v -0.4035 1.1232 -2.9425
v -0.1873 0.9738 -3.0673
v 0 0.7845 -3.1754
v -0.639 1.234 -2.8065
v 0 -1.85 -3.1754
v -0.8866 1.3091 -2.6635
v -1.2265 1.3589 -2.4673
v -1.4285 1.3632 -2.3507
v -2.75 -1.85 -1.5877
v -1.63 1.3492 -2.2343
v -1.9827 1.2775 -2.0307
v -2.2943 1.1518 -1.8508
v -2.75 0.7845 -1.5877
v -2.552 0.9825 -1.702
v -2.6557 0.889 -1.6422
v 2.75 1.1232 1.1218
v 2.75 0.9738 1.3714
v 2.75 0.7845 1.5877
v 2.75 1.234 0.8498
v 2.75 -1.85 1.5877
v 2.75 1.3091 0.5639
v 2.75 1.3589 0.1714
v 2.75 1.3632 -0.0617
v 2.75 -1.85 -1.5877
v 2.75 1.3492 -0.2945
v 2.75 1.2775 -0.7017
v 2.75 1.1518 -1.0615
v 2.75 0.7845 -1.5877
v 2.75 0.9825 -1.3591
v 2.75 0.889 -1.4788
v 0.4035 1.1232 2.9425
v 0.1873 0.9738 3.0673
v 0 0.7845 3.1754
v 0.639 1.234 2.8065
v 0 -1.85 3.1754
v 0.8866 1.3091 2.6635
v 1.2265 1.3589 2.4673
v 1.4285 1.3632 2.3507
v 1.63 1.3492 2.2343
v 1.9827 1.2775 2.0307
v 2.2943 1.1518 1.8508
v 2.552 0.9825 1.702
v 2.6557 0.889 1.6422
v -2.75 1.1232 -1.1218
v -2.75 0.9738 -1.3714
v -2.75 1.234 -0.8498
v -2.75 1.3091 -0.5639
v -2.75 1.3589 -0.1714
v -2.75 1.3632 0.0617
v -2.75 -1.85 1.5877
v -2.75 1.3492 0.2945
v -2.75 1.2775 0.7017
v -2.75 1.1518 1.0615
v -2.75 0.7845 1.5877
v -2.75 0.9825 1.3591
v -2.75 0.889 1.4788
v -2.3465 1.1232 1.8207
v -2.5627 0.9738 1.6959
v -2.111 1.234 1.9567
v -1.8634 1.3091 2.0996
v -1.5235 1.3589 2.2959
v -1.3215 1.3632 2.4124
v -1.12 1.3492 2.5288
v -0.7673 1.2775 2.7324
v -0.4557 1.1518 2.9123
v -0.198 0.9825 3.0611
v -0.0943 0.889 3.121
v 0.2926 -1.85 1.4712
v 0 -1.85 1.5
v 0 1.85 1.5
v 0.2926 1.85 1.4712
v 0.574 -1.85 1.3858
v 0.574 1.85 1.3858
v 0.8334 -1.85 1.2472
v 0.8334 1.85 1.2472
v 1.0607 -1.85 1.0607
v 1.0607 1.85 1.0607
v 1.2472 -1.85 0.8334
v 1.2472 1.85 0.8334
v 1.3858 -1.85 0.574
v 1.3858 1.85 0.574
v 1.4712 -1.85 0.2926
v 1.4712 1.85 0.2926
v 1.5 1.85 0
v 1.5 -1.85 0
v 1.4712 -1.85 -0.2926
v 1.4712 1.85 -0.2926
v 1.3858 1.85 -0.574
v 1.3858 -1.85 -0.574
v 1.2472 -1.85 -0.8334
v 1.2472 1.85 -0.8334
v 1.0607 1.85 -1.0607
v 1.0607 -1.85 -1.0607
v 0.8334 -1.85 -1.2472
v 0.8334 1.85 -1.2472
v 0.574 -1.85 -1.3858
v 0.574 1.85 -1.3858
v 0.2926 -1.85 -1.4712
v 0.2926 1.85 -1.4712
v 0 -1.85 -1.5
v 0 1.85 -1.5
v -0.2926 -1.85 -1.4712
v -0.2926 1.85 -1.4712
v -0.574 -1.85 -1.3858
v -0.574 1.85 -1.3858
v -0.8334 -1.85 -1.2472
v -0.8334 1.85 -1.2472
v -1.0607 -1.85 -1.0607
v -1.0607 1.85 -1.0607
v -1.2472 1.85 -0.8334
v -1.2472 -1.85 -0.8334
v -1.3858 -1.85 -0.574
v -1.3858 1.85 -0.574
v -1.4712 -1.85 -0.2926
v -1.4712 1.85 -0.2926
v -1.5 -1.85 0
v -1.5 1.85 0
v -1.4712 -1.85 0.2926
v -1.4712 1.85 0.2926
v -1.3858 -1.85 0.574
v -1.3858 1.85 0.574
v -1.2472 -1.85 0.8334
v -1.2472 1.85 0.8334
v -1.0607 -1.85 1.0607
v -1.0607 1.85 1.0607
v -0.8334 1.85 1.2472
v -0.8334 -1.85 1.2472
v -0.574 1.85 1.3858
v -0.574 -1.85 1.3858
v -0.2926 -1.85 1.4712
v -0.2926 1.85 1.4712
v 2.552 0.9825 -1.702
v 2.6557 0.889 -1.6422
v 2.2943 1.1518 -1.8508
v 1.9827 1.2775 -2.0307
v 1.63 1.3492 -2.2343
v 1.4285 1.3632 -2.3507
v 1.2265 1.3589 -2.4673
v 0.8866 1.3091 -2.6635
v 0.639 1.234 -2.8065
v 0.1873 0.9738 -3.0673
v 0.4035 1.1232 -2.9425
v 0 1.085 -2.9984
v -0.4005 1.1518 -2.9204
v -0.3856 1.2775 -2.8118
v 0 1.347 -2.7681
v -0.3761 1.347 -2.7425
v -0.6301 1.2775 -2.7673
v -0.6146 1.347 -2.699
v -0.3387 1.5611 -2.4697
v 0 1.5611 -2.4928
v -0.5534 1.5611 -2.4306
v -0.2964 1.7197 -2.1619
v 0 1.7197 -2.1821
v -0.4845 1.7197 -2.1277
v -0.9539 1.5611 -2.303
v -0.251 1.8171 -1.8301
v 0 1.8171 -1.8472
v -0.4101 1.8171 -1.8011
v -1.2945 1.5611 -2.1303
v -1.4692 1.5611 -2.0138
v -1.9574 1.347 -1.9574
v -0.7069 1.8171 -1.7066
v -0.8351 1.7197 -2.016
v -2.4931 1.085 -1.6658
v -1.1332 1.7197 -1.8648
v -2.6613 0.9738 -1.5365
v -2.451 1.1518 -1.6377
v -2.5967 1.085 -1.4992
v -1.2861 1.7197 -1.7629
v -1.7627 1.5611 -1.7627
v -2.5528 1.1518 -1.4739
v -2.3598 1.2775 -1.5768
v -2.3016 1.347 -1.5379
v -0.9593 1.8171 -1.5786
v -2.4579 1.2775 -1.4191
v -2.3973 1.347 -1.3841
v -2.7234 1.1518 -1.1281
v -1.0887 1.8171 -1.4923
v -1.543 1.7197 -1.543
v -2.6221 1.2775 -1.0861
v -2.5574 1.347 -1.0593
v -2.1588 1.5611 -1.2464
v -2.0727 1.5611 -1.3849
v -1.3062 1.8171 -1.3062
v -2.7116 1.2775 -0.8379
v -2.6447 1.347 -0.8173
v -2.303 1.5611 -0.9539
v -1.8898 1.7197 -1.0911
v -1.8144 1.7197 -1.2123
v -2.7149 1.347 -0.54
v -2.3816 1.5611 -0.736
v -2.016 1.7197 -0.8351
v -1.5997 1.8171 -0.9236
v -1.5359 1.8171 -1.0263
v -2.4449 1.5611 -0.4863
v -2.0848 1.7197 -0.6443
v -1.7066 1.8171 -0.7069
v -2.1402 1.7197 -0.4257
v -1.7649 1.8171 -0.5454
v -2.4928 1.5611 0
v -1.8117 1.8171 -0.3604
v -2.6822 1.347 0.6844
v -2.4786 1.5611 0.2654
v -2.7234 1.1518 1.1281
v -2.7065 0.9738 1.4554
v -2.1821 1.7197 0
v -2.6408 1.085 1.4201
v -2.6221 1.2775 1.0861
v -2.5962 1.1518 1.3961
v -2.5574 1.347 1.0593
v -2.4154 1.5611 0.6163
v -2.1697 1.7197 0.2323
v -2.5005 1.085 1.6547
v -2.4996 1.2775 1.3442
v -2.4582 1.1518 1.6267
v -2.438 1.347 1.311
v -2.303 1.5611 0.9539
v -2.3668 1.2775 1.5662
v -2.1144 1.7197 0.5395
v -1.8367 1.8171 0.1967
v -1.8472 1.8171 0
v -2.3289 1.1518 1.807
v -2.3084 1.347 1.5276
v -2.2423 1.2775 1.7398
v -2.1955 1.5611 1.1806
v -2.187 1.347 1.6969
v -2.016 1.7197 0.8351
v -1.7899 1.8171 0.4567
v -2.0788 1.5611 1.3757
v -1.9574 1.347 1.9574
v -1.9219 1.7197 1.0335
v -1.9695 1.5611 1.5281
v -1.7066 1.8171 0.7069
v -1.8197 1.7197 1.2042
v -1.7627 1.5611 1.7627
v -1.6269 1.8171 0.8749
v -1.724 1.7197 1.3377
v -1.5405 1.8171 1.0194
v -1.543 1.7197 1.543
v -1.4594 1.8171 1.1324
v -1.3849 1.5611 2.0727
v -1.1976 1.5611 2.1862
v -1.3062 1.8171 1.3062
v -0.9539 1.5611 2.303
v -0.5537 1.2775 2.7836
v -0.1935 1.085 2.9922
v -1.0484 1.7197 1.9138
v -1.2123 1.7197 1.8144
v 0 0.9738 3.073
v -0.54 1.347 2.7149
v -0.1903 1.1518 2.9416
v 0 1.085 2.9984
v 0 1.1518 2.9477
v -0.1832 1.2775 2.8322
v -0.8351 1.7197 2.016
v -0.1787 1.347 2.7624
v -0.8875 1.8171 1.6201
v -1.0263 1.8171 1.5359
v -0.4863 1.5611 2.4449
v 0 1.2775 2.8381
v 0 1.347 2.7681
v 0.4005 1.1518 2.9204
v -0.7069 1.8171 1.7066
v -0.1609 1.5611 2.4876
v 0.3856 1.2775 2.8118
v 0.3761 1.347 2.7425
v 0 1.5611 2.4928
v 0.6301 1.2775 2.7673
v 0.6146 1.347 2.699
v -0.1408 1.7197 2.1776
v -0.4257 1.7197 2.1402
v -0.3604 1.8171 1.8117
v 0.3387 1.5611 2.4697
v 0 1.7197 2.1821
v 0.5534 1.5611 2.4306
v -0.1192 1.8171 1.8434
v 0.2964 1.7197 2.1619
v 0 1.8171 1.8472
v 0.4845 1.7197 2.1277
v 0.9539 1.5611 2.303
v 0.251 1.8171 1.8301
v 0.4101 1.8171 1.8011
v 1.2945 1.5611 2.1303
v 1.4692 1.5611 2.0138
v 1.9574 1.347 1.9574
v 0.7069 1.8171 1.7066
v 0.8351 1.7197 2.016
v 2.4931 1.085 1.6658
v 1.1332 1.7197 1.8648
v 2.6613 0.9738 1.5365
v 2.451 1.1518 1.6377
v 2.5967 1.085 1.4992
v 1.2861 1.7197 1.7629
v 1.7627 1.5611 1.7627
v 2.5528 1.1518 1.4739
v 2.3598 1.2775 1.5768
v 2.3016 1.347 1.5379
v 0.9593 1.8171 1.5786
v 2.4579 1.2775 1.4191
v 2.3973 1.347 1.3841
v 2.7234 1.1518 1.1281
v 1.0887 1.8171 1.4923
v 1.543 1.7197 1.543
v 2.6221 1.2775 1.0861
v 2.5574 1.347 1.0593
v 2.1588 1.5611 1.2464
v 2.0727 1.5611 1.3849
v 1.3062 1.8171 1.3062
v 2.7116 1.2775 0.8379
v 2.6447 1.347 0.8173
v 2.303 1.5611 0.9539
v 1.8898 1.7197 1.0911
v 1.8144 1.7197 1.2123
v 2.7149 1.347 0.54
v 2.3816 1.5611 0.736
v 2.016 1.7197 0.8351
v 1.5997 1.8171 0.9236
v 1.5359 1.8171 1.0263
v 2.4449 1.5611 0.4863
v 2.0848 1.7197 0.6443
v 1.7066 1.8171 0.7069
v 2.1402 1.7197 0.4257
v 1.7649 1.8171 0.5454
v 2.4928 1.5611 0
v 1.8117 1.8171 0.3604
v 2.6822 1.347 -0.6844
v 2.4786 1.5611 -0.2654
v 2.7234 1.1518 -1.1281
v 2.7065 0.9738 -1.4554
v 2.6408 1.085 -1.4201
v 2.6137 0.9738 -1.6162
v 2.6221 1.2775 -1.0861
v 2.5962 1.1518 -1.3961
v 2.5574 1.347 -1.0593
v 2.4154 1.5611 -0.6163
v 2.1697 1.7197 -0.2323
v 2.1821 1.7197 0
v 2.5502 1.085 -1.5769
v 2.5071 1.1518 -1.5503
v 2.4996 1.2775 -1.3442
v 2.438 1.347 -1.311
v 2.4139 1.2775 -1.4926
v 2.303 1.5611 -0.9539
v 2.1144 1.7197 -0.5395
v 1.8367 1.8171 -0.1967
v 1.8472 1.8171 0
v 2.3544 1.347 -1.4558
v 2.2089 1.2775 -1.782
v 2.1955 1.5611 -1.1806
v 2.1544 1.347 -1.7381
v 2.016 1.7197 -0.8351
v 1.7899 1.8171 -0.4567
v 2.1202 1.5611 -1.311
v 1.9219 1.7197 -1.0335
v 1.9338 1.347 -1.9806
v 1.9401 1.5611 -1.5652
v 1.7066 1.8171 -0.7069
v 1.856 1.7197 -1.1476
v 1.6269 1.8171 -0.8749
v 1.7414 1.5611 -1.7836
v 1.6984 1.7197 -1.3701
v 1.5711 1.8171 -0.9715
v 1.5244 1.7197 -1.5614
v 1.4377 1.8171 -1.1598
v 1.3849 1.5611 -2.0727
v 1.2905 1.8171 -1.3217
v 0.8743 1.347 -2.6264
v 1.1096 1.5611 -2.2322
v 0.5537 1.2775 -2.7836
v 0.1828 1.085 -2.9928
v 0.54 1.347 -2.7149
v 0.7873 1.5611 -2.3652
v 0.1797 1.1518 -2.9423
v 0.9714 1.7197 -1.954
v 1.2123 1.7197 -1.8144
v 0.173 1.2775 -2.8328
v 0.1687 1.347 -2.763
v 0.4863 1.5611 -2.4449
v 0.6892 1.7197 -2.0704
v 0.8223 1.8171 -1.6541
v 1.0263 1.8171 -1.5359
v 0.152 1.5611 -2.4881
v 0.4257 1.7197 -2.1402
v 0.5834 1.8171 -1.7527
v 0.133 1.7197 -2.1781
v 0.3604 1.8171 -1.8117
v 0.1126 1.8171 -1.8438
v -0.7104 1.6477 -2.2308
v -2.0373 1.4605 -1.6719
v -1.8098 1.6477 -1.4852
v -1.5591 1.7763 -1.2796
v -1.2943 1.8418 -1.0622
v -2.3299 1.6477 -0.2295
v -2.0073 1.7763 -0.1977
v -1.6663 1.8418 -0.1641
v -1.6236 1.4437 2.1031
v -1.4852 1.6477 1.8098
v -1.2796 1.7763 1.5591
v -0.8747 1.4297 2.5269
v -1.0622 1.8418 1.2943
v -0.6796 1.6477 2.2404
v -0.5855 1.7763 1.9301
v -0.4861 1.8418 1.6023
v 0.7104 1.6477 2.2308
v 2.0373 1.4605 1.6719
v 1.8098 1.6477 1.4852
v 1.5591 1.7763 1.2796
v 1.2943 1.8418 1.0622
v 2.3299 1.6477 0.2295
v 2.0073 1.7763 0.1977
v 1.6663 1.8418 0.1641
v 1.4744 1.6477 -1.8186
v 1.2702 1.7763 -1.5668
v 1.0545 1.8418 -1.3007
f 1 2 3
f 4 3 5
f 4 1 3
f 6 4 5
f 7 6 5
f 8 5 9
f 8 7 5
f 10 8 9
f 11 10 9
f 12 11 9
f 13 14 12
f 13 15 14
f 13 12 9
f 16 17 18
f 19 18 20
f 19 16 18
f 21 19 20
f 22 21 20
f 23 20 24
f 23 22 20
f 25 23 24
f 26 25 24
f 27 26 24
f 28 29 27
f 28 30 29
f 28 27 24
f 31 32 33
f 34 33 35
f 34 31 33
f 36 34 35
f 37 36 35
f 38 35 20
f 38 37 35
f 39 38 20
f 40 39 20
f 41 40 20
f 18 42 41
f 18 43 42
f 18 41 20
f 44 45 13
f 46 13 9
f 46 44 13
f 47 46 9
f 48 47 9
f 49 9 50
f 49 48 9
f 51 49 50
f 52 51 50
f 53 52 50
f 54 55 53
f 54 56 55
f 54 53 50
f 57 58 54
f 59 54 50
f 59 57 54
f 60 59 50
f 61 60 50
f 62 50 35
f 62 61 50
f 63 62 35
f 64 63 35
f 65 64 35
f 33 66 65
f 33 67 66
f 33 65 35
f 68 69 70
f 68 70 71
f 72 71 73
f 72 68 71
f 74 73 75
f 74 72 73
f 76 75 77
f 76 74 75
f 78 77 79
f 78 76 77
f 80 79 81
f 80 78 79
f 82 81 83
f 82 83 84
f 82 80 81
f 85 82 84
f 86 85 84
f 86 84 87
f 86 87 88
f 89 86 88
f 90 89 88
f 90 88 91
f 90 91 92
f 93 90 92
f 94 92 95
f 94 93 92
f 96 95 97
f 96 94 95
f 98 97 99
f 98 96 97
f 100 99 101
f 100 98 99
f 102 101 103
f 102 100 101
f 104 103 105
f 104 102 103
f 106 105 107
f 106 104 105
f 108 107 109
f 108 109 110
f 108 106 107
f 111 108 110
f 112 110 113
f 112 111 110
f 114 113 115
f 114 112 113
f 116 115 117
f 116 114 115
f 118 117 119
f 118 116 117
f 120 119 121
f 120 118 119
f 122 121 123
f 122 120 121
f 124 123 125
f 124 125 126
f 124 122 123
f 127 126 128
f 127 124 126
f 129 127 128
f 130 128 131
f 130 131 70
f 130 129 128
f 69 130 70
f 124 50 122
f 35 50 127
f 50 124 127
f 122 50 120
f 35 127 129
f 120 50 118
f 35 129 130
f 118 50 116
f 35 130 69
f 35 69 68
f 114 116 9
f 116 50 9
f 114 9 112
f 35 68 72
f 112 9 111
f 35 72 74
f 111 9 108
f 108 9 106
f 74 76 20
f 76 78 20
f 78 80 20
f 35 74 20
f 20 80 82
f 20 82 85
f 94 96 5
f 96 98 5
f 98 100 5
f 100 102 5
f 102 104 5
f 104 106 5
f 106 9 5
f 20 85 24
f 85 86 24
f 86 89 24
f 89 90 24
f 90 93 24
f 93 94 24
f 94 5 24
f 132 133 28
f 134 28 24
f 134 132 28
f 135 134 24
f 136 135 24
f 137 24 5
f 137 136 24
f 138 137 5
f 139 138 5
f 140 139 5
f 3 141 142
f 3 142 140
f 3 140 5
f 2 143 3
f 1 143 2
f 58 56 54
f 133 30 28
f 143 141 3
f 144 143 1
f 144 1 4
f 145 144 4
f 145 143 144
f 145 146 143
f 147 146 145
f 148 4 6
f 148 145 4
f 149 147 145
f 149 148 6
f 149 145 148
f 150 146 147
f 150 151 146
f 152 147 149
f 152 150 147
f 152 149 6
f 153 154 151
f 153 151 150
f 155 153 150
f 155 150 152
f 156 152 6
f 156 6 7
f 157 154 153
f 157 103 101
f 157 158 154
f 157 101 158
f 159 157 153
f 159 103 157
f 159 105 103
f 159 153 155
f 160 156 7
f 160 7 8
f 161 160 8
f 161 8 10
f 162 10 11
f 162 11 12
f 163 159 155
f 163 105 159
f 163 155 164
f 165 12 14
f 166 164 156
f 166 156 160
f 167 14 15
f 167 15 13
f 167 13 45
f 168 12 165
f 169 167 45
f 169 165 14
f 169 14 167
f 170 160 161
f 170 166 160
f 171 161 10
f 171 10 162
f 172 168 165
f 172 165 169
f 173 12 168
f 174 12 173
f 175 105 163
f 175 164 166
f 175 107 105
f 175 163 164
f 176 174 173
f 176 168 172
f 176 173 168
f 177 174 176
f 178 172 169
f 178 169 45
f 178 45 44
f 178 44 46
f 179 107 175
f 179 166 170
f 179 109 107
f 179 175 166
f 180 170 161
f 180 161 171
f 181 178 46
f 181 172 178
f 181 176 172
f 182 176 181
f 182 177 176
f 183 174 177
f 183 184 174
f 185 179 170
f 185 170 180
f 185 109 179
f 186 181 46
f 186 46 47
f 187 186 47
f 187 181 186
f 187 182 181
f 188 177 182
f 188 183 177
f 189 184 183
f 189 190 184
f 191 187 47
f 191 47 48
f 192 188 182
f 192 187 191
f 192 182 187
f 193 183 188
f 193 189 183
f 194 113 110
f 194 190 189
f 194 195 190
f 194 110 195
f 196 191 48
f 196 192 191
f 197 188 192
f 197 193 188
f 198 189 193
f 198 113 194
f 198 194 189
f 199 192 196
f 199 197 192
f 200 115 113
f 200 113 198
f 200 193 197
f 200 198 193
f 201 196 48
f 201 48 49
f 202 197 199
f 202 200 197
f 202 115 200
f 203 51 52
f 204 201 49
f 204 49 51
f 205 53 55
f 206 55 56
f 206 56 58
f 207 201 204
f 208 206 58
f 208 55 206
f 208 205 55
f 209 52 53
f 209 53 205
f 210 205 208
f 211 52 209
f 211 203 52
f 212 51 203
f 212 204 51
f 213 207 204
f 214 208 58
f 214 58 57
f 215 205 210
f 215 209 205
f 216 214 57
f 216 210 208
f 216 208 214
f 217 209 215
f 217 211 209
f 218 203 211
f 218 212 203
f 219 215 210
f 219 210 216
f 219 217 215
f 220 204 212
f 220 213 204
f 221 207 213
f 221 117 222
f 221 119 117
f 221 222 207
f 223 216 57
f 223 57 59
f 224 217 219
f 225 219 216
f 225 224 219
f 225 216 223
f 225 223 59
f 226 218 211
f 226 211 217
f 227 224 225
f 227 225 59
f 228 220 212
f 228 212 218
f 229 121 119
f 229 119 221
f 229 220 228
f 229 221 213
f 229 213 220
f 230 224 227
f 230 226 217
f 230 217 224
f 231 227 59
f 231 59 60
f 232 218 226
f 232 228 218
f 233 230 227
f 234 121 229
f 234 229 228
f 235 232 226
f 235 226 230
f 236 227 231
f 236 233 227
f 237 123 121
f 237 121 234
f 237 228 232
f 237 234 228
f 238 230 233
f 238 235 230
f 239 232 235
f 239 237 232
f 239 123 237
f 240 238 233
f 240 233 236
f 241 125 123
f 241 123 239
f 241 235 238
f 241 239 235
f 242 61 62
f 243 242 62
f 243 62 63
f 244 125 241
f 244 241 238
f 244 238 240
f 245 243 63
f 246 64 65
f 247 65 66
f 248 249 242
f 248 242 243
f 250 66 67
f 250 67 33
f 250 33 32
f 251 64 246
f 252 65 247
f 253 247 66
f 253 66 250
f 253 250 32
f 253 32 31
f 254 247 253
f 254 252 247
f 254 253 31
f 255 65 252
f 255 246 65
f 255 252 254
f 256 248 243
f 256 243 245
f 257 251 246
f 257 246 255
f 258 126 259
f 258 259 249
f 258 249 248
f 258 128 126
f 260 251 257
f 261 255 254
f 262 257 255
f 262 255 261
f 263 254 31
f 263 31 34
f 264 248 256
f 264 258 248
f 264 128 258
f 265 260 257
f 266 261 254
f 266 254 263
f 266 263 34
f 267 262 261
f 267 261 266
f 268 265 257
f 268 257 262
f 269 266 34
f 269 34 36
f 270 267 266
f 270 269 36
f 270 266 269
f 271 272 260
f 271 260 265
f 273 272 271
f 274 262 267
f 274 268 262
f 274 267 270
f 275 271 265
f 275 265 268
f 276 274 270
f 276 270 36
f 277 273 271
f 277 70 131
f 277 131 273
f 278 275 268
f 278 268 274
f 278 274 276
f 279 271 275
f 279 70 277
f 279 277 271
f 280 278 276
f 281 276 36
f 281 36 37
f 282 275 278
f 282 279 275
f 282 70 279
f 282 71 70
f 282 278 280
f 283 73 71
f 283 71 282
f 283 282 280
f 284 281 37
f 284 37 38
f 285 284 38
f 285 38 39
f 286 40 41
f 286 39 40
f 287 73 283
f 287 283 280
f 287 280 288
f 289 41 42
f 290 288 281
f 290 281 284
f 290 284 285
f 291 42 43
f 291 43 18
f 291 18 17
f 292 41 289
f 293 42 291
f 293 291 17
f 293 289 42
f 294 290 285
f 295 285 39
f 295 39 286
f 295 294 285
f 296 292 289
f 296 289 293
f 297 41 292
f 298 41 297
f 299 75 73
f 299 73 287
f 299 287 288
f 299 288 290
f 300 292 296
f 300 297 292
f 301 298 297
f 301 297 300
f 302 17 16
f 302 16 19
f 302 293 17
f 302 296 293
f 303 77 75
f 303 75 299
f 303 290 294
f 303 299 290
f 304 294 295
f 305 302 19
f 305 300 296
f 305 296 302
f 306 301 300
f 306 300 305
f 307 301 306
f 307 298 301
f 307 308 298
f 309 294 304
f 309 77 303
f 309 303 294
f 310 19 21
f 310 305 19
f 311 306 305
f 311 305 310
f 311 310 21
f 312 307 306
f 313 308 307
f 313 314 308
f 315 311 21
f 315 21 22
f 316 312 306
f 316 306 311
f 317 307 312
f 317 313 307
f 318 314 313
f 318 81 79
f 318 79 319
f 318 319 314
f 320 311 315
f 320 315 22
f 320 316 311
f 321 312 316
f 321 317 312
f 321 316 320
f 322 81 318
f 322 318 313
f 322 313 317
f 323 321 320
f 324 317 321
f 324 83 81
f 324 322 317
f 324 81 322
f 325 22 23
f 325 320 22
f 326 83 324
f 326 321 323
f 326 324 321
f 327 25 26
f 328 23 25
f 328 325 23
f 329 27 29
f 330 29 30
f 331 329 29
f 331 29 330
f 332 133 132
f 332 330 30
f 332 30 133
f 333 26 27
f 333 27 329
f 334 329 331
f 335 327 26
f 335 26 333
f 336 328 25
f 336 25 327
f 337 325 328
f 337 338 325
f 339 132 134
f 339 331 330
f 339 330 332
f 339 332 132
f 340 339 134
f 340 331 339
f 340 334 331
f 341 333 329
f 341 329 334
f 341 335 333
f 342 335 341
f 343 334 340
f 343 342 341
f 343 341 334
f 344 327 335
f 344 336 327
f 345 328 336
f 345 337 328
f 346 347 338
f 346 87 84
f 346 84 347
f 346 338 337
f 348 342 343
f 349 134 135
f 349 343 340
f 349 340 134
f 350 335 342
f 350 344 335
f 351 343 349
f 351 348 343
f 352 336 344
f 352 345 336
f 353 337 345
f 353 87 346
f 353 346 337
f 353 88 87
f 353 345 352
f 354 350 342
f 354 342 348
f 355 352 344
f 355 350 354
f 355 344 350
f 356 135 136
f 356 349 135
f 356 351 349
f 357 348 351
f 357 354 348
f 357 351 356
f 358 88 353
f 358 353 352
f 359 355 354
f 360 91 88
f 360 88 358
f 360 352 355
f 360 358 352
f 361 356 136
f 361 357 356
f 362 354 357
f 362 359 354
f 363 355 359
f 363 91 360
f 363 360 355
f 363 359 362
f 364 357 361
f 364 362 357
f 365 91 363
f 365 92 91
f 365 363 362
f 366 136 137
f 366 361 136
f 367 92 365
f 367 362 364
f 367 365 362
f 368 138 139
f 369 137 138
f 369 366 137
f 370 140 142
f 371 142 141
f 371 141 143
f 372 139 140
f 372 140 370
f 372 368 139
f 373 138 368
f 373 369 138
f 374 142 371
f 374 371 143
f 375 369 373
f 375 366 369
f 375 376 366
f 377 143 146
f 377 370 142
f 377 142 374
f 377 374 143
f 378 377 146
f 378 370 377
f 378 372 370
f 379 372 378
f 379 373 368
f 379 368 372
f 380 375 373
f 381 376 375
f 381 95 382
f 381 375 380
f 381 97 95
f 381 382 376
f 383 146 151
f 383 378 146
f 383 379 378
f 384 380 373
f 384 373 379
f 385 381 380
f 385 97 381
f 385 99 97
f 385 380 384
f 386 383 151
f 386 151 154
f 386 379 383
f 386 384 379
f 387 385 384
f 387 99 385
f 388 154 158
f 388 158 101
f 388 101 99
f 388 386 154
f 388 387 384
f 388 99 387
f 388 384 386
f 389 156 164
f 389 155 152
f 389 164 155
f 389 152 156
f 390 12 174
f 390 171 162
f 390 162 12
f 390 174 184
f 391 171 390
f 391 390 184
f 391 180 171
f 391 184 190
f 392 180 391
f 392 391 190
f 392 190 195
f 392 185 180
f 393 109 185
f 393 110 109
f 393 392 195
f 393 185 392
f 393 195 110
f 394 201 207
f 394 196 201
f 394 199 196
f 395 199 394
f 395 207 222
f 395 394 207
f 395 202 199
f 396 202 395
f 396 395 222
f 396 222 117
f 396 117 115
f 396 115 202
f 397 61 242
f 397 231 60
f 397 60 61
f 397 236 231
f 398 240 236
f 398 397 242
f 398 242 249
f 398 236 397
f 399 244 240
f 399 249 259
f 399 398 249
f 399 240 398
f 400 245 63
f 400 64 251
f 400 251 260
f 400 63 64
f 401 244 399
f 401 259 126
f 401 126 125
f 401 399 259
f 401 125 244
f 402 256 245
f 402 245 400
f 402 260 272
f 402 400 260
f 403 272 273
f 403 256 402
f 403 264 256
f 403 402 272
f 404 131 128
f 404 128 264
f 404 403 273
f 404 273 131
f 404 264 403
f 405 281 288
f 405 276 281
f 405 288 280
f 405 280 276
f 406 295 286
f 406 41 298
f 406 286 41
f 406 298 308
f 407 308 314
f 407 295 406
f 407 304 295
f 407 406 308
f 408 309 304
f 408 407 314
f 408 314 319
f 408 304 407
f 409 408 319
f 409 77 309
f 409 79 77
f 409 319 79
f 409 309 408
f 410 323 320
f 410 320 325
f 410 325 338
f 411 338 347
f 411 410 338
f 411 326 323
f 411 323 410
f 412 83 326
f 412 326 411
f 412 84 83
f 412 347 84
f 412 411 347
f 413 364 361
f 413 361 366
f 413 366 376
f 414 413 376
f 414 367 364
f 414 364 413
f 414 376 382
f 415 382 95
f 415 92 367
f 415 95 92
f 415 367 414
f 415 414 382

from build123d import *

# Parameters (mm, degrees)
SKETCH3_R           = 1.5
BOSS_EXTRUDE1_DEPTH = 1.85


with BuildPart() as part:
    # Sketch3 → Boss-Extrude1 (new, symmetric)
    with BuildSketch(Plane(origin=(0, 0, 0), x_dir=(1, 0, 0), z_dir=(0, 1, 0))):
        Polygon((2.75, 1.58771324), (0, 3.175426481), (-2.75, 1.58771324), (-2.75, -1.58771324), (0, -3.175426481), (2.75, -1.58771324), align=None)
        Circle(SKETCH3_R, mode=Mode.SUBTRACT)
    extrude(amount=BOSS_EXTRUDE1_DEPTH, both=True)

    # Sketch5 → Cut-Revolve1 (revolve, cut)
    with BuildSketch(Plane(origin=(0, 0, 0), x_dir=(0, 0, -1), z_dir=(1, 0, 0))):
        with BuildLine():
            Line((1.5, 1.85), (3.175426481, 1.85))
            Line((3.175426481, 1.85), (3.175426481, 0.784503734))
            ThreePointArc((3.175426481, 0.784503734), (2.492765857, 1.561062444), (1.5, 1.85))
        make_face()
    revolve(axis=Axis((0, 0, 0), (0, 1, 0)), mode=Mode.SUBTRACT)


solid = part.part
